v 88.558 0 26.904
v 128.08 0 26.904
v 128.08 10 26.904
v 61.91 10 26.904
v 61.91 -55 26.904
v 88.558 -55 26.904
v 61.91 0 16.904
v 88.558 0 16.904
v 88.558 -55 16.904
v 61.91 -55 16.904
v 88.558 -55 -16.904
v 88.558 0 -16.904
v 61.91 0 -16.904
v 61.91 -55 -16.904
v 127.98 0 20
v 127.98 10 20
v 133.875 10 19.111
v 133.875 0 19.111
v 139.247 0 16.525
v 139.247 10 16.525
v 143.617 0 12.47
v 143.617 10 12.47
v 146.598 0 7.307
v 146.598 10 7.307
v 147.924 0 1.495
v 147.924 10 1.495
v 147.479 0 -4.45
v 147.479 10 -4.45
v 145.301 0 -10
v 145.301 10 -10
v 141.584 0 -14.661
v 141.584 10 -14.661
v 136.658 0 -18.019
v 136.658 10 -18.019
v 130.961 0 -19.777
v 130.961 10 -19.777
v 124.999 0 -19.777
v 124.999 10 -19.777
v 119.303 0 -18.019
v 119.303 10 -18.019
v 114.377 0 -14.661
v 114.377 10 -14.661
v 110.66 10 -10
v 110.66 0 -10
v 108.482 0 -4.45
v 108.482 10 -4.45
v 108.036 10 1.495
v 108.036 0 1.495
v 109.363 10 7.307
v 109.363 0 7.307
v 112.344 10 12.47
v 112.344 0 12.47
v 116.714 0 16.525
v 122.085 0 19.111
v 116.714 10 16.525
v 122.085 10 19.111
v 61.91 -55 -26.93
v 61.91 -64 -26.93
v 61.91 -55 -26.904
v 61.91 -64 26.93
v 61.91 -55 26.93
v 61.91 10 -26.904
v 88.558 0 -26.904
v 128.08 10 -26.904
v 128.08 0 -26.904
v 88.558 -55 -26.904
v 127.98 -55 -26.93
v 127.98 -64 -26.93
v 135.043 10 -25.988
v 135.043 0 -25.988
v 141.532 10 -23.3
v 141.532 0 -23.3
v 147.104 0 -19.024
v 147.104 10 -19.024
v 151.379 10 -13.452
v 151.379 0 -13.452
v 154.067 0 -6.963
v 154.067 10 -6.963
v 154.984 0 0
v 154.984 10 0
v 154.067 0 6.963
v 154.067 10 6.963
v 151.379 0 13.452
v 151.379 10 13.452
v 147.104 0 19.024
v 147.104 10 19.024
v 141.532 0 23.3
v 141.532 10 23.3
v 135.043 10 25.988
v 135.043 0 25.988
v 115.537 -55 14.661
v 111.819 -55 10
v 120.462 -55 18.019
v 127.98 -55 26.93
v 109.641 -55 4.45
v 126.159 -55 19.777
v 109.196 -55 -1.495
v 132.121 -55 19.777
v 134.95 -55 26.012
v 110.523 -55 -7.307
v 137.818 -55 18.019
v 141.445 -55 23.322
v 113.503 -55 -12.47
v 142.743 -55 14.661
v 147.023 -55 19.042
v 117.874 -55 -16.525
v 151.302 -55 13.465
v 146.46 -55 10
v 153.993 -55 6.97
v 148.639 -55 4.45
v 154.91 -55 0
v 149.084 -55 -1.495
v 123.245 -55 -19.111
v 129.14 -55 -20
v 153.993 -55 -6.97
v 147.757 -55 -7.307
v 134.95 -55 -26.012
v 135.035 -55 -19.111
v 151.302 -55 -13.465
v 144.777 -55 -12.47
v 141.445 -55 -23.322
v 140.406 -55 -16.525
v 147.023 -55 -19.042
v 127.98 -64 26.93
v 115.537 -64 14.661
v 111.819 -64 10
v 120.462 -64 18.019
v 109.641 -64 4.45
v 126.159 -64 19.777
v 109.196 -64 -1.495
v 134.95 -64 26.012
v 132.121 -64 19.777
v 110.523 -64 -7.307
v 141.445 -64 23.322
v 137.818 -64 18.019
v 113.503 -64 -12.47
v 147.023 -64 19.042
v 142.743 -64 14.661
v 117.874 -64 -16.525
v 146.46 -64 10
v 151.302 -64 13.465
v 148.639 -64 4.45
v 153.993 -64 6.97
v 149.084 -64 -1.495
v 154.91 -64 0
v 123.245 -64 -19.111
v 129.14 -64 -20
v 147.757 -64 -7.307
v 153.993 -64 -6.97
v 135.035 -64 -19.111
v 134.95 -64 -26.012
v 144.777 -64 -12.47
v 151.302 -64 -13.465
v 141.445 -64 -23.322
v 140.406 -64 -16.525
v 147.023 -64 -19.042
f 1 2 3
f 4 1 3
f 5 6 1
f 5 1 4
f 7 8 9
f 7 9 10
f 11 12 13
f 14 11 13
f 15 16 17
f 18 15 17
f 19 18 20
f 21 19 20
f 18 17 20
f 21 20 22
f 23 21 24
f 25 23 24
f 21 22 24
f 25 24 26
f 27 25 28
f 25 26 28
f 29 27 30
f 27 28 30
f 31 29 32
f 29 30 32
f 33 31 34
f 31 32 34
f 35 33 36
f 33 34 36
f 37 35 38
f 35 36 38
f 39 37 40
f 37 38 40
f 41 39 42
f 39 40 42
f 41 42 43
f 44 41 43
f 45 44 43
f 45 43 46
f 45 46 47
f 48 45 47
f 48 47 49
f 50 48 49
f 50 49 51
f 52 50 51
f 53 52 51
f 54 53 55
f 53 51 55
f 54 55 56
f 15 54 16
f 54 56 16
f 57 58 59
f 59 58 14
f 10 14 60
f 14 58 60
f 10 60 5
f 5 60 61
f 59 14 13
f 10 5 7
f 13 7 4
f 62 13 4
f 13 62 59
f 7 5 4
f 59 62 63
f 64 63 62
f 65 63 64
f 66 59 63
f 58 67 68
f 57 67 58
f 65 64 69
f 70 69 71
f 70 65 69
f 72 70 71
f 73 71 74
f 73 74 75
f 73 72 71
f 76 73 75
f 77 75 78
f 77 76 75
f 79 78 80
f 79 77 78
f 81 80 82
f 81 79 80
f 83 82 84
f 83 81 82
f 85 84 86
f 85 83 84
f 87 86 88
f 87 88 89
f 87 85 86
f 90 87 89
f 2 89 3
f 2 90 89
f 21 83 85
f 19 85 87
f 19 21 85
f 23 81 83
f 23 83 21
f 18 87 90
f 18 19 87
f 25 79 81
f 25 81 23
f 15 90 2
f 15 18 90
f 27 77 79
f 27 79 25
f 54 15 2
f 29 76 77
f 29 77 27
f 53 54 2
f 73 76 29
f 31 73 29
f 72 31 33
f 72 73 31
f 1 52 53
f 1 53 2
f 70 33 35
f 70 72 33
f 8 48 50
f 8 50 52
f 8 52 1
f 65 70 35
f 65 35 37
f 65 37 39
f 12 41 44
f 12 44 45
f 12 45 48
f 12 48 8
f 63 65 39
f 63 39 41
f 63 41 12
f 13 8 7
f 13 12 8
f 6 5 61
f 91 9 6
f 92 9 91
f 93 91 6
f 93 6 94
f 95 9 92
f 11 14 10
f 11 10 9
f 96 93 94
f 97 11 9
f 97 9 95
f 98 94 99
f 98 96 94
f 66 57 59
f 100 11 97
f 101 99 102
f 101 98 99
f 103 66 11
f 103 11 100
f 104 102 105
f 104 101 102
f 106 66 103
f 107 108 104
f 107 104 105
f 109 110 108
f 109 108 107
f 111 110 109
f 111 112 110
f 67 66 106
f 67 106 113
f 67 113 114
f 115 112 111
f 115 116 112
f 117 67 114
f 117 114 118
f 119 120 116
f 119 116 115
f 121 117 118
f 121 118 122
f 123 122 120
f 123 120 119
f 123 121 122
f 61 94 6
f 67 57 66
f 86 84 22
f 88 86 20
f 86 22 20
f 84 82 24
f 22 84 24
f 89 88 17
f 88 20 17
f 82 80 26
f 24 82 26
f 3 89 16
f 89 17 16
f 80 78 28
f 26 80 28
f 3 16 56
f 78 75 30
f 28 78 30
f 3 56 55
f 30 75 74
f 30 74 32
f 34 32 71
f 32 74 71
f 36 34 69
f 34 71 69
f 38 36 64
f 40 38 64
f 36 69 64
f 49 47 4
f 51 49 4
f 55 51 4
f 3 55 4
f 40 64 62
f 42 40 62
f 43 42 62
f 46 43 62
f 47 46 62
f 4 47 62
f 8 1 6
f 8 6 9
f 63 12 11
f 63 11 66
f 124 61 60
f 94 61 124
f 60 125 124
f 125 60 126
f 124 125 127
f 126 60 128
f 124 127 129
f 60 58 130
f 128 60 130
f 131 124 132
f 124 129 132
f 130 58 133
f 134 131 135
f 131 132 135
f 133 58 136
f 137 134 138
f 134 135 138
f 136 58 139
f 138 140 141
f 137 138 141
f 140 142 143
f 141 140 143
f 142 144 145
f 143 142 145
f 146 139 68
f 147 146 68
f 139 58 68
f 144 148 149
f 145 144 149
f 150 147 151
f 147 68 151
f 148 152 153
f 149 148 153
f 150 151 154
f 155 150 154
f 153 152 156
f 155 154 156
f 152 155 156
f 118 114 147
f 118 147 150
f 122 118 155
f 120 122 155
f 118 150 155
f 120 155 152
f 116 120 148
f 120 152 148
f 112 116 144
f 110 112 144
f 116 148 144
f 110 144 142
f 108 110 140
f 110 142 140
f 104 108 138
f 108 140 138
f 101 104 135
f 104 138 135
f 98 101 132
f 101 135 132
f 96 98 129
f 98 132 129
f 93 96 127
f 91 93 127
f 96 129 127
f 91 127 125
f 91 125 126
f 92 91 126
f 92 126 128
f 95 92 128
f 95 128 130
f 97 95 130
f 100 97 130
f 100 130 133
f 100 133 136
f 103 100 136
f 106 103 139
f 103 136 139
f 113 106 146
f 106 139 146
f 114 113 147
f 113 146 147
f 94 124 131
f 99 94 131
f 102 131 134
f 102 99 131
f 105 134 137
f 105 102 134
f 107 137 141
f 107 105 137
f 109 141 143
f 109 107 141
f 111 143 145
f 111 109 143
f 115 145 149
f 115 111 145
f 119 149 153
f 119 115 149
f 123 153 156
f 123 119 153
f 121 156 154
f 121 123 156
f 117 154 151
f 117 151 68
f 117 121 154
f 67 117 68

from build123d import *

# Parameters (mm, degrees)
SALIENTE_EXTRUIR1_DEPTH = 10
CROQUIS2_R              = 20
CORTAR_EXTRUIR1_DEPTH   = 10
CROQUIS3_R              = 20
CORTAR_EXTRUIR2_DEPTH   = 10
CROQUIS5_W              = 60
CROQUIS5_H              = 10
SALIENTE_EXTRUIR3_DEPTH = 55
SALIENTE_EXTRUIR4_DEPTH = 9
CROQUIS8_R              = 20
CORTAR_EXTRUIR3_DEPTH   = 9
CROQUIS9_R              = 20
CORTAR_EXTRUIR4_DEPTH   = 10
CROQUIS11_W             = 94.452906293
CROQUIS11_H             = 104.053500068
CORTAR_EXTRUIR6_DEPTH   = 54
CROQUIS15_W             = 76.60704733
CROQUIS15_H             = 9.910818825
CORTAR_EXTRUIR7_DEPTH   = 76


with BuildPart() as part:
    # Croquis1 → Saliente-Extruir1 (new body)
    with BuildSketch(Plane(origin=(0, 0, 0), x_dir=(1, 0, 0), z_dir=(0, 1, 0))):
        with BuildLine():
            Line((0, 26.904276051), (128.079511341, 26.904276051))
            ThreePointArc((128.079511341, 26.904276051), (154.983787391, 0), (128.079511341, -26.904276051))
            Line((128.079511341, -26.904276051), (0, -26.904276051))
            ThreePointArc((0, -26.904276051), (-26.904276051, 0), (0, 26.904276051))
        make_face()
    extrude(amount=SALIENTE_EXTRUIR1_DEPTH)

    # Croquis2 → Cortar-Extruir1 (cut)
    with BuildSketch(Plane.XZ):
        with Locations(Location((0, 0, 0), (0, 0, 270))):
            Circle(CROQUIS2_R)
    extrude(amount=-CORTAR_EXTRUIR1_DEPTH, mode=Mode.SUBTRACT)

    # Croquis3 → Cortar-Extruir2 (cut)
    with BuildSketch(Plane(origin=(0, 10, 0), x_dir=(1, 0, 0), z_dir=(0, 1, 0))):
        with Locations(Location((127.980340476, 0, 0), (0, 0, 270))):
            Circle(CROQUIS3_R)
    extrude(amount=-CORTAR_EXTRUIR2_DEPTH, mode=Mode.SUBTRACT)

    # Croquis5 → Saliente-Extruir3 (add)
    with BuildSketch(Plane(origin=(0, 0, 0), x_dir=(-1, 0, 0), z_dir=(0, -1, 0))):
        with Locations((-58.558456053, -21.904276051)):
            Rectangle(CROQUIS5_W, CROQUIS5_H)
        with Locations((-58.558456053, 21.904276051)):
            Rectangle(CROQUIS5_W, CROQUIS5_H)
    extrude(amount=SALIENTE_EXTRUIR3_DEPTH)

    # Croquis7 → Saliente-Extruir4 (add)
    with BuildSketch(Plane(origin=(0, -55, 0), x_dir=(-1, 0, 0), z_dir=(0, -1, 0))):
        with BuildLine():
            Line((0, -26.929773303), (-127.980340476, -26.929773303))
            ThreePointArc((-127.980340476, -26.929773303), (-154.910113778, 0), (-127.980340476, 26.929773303))
            Line((-127.980340476, 26.929773303), (0, 26.929773303))
            ThreePointArc((0, 26.929773303), (26.929773303, 0), (0, -26.929773303))
        make_face()
    extrude(amount=SALIENTE_EXTRUIR4_DEPTH)

    # Croquis8 → Cortar-Extruir3 (cut)
    with BuildSketch(Plane(origin=(0, -64, 0), x_dir=(-1, 0, 0), z_dir=(0, -1, 0))):
        with Locations(Location((-129.139989333, 0, 0), (0, 0, 90))):
            Circle(CROQUIS8_R)
    extrude(amount=-CORTAR_EXTRUIR3_DEPTH, mode=Mode.SUBTRACT)

    # Croquis9 → Cortar-Extruir4 (cut)
    with BuildSketch(Plane(origin=(0, -64, 0), x_dir=(-1, 0, 0), z_dir=(0, -1, 0))):
        with Locations(Location((0, 0, 0), (0, 0, 90))):
            Circle(CROQUIS9_R)
    extrude(amount=-CORTAR_EXTRUIR4_DEPTH, mode=Mode.SUBTRACT)

    # Croquis11 → Cortar-Extruir6 (cut)
    with BuildSketch(Plane.XY.offset(26.929773303)):
        with Locations((14.683121645, -22.540401026)):
            Rectangle(CROQUIS11_W, CROQUIS11_H)
    extrude(amount=-CORTAR_EXTRUIR6_DEPTH, mode=Mode.SUBTRACT)

    # Croquis15 → Cortar-Extruir7 (cut)
    with BuildSketch(Plane(origin=(61.909574791, 10, 26.705021593), x_dir=(1, 0, 0), z_dir=(0, 1, 0))):
        with Locations((-38.303523665, -4.955409412)):
            Rectangle(CROQUIS15_W, CROQUIS15_H)
    extrude(amount=-CORTAR_EXTRUIR7_DEPTH, mode=Mode.SUBTRACT)


solid = part.part
